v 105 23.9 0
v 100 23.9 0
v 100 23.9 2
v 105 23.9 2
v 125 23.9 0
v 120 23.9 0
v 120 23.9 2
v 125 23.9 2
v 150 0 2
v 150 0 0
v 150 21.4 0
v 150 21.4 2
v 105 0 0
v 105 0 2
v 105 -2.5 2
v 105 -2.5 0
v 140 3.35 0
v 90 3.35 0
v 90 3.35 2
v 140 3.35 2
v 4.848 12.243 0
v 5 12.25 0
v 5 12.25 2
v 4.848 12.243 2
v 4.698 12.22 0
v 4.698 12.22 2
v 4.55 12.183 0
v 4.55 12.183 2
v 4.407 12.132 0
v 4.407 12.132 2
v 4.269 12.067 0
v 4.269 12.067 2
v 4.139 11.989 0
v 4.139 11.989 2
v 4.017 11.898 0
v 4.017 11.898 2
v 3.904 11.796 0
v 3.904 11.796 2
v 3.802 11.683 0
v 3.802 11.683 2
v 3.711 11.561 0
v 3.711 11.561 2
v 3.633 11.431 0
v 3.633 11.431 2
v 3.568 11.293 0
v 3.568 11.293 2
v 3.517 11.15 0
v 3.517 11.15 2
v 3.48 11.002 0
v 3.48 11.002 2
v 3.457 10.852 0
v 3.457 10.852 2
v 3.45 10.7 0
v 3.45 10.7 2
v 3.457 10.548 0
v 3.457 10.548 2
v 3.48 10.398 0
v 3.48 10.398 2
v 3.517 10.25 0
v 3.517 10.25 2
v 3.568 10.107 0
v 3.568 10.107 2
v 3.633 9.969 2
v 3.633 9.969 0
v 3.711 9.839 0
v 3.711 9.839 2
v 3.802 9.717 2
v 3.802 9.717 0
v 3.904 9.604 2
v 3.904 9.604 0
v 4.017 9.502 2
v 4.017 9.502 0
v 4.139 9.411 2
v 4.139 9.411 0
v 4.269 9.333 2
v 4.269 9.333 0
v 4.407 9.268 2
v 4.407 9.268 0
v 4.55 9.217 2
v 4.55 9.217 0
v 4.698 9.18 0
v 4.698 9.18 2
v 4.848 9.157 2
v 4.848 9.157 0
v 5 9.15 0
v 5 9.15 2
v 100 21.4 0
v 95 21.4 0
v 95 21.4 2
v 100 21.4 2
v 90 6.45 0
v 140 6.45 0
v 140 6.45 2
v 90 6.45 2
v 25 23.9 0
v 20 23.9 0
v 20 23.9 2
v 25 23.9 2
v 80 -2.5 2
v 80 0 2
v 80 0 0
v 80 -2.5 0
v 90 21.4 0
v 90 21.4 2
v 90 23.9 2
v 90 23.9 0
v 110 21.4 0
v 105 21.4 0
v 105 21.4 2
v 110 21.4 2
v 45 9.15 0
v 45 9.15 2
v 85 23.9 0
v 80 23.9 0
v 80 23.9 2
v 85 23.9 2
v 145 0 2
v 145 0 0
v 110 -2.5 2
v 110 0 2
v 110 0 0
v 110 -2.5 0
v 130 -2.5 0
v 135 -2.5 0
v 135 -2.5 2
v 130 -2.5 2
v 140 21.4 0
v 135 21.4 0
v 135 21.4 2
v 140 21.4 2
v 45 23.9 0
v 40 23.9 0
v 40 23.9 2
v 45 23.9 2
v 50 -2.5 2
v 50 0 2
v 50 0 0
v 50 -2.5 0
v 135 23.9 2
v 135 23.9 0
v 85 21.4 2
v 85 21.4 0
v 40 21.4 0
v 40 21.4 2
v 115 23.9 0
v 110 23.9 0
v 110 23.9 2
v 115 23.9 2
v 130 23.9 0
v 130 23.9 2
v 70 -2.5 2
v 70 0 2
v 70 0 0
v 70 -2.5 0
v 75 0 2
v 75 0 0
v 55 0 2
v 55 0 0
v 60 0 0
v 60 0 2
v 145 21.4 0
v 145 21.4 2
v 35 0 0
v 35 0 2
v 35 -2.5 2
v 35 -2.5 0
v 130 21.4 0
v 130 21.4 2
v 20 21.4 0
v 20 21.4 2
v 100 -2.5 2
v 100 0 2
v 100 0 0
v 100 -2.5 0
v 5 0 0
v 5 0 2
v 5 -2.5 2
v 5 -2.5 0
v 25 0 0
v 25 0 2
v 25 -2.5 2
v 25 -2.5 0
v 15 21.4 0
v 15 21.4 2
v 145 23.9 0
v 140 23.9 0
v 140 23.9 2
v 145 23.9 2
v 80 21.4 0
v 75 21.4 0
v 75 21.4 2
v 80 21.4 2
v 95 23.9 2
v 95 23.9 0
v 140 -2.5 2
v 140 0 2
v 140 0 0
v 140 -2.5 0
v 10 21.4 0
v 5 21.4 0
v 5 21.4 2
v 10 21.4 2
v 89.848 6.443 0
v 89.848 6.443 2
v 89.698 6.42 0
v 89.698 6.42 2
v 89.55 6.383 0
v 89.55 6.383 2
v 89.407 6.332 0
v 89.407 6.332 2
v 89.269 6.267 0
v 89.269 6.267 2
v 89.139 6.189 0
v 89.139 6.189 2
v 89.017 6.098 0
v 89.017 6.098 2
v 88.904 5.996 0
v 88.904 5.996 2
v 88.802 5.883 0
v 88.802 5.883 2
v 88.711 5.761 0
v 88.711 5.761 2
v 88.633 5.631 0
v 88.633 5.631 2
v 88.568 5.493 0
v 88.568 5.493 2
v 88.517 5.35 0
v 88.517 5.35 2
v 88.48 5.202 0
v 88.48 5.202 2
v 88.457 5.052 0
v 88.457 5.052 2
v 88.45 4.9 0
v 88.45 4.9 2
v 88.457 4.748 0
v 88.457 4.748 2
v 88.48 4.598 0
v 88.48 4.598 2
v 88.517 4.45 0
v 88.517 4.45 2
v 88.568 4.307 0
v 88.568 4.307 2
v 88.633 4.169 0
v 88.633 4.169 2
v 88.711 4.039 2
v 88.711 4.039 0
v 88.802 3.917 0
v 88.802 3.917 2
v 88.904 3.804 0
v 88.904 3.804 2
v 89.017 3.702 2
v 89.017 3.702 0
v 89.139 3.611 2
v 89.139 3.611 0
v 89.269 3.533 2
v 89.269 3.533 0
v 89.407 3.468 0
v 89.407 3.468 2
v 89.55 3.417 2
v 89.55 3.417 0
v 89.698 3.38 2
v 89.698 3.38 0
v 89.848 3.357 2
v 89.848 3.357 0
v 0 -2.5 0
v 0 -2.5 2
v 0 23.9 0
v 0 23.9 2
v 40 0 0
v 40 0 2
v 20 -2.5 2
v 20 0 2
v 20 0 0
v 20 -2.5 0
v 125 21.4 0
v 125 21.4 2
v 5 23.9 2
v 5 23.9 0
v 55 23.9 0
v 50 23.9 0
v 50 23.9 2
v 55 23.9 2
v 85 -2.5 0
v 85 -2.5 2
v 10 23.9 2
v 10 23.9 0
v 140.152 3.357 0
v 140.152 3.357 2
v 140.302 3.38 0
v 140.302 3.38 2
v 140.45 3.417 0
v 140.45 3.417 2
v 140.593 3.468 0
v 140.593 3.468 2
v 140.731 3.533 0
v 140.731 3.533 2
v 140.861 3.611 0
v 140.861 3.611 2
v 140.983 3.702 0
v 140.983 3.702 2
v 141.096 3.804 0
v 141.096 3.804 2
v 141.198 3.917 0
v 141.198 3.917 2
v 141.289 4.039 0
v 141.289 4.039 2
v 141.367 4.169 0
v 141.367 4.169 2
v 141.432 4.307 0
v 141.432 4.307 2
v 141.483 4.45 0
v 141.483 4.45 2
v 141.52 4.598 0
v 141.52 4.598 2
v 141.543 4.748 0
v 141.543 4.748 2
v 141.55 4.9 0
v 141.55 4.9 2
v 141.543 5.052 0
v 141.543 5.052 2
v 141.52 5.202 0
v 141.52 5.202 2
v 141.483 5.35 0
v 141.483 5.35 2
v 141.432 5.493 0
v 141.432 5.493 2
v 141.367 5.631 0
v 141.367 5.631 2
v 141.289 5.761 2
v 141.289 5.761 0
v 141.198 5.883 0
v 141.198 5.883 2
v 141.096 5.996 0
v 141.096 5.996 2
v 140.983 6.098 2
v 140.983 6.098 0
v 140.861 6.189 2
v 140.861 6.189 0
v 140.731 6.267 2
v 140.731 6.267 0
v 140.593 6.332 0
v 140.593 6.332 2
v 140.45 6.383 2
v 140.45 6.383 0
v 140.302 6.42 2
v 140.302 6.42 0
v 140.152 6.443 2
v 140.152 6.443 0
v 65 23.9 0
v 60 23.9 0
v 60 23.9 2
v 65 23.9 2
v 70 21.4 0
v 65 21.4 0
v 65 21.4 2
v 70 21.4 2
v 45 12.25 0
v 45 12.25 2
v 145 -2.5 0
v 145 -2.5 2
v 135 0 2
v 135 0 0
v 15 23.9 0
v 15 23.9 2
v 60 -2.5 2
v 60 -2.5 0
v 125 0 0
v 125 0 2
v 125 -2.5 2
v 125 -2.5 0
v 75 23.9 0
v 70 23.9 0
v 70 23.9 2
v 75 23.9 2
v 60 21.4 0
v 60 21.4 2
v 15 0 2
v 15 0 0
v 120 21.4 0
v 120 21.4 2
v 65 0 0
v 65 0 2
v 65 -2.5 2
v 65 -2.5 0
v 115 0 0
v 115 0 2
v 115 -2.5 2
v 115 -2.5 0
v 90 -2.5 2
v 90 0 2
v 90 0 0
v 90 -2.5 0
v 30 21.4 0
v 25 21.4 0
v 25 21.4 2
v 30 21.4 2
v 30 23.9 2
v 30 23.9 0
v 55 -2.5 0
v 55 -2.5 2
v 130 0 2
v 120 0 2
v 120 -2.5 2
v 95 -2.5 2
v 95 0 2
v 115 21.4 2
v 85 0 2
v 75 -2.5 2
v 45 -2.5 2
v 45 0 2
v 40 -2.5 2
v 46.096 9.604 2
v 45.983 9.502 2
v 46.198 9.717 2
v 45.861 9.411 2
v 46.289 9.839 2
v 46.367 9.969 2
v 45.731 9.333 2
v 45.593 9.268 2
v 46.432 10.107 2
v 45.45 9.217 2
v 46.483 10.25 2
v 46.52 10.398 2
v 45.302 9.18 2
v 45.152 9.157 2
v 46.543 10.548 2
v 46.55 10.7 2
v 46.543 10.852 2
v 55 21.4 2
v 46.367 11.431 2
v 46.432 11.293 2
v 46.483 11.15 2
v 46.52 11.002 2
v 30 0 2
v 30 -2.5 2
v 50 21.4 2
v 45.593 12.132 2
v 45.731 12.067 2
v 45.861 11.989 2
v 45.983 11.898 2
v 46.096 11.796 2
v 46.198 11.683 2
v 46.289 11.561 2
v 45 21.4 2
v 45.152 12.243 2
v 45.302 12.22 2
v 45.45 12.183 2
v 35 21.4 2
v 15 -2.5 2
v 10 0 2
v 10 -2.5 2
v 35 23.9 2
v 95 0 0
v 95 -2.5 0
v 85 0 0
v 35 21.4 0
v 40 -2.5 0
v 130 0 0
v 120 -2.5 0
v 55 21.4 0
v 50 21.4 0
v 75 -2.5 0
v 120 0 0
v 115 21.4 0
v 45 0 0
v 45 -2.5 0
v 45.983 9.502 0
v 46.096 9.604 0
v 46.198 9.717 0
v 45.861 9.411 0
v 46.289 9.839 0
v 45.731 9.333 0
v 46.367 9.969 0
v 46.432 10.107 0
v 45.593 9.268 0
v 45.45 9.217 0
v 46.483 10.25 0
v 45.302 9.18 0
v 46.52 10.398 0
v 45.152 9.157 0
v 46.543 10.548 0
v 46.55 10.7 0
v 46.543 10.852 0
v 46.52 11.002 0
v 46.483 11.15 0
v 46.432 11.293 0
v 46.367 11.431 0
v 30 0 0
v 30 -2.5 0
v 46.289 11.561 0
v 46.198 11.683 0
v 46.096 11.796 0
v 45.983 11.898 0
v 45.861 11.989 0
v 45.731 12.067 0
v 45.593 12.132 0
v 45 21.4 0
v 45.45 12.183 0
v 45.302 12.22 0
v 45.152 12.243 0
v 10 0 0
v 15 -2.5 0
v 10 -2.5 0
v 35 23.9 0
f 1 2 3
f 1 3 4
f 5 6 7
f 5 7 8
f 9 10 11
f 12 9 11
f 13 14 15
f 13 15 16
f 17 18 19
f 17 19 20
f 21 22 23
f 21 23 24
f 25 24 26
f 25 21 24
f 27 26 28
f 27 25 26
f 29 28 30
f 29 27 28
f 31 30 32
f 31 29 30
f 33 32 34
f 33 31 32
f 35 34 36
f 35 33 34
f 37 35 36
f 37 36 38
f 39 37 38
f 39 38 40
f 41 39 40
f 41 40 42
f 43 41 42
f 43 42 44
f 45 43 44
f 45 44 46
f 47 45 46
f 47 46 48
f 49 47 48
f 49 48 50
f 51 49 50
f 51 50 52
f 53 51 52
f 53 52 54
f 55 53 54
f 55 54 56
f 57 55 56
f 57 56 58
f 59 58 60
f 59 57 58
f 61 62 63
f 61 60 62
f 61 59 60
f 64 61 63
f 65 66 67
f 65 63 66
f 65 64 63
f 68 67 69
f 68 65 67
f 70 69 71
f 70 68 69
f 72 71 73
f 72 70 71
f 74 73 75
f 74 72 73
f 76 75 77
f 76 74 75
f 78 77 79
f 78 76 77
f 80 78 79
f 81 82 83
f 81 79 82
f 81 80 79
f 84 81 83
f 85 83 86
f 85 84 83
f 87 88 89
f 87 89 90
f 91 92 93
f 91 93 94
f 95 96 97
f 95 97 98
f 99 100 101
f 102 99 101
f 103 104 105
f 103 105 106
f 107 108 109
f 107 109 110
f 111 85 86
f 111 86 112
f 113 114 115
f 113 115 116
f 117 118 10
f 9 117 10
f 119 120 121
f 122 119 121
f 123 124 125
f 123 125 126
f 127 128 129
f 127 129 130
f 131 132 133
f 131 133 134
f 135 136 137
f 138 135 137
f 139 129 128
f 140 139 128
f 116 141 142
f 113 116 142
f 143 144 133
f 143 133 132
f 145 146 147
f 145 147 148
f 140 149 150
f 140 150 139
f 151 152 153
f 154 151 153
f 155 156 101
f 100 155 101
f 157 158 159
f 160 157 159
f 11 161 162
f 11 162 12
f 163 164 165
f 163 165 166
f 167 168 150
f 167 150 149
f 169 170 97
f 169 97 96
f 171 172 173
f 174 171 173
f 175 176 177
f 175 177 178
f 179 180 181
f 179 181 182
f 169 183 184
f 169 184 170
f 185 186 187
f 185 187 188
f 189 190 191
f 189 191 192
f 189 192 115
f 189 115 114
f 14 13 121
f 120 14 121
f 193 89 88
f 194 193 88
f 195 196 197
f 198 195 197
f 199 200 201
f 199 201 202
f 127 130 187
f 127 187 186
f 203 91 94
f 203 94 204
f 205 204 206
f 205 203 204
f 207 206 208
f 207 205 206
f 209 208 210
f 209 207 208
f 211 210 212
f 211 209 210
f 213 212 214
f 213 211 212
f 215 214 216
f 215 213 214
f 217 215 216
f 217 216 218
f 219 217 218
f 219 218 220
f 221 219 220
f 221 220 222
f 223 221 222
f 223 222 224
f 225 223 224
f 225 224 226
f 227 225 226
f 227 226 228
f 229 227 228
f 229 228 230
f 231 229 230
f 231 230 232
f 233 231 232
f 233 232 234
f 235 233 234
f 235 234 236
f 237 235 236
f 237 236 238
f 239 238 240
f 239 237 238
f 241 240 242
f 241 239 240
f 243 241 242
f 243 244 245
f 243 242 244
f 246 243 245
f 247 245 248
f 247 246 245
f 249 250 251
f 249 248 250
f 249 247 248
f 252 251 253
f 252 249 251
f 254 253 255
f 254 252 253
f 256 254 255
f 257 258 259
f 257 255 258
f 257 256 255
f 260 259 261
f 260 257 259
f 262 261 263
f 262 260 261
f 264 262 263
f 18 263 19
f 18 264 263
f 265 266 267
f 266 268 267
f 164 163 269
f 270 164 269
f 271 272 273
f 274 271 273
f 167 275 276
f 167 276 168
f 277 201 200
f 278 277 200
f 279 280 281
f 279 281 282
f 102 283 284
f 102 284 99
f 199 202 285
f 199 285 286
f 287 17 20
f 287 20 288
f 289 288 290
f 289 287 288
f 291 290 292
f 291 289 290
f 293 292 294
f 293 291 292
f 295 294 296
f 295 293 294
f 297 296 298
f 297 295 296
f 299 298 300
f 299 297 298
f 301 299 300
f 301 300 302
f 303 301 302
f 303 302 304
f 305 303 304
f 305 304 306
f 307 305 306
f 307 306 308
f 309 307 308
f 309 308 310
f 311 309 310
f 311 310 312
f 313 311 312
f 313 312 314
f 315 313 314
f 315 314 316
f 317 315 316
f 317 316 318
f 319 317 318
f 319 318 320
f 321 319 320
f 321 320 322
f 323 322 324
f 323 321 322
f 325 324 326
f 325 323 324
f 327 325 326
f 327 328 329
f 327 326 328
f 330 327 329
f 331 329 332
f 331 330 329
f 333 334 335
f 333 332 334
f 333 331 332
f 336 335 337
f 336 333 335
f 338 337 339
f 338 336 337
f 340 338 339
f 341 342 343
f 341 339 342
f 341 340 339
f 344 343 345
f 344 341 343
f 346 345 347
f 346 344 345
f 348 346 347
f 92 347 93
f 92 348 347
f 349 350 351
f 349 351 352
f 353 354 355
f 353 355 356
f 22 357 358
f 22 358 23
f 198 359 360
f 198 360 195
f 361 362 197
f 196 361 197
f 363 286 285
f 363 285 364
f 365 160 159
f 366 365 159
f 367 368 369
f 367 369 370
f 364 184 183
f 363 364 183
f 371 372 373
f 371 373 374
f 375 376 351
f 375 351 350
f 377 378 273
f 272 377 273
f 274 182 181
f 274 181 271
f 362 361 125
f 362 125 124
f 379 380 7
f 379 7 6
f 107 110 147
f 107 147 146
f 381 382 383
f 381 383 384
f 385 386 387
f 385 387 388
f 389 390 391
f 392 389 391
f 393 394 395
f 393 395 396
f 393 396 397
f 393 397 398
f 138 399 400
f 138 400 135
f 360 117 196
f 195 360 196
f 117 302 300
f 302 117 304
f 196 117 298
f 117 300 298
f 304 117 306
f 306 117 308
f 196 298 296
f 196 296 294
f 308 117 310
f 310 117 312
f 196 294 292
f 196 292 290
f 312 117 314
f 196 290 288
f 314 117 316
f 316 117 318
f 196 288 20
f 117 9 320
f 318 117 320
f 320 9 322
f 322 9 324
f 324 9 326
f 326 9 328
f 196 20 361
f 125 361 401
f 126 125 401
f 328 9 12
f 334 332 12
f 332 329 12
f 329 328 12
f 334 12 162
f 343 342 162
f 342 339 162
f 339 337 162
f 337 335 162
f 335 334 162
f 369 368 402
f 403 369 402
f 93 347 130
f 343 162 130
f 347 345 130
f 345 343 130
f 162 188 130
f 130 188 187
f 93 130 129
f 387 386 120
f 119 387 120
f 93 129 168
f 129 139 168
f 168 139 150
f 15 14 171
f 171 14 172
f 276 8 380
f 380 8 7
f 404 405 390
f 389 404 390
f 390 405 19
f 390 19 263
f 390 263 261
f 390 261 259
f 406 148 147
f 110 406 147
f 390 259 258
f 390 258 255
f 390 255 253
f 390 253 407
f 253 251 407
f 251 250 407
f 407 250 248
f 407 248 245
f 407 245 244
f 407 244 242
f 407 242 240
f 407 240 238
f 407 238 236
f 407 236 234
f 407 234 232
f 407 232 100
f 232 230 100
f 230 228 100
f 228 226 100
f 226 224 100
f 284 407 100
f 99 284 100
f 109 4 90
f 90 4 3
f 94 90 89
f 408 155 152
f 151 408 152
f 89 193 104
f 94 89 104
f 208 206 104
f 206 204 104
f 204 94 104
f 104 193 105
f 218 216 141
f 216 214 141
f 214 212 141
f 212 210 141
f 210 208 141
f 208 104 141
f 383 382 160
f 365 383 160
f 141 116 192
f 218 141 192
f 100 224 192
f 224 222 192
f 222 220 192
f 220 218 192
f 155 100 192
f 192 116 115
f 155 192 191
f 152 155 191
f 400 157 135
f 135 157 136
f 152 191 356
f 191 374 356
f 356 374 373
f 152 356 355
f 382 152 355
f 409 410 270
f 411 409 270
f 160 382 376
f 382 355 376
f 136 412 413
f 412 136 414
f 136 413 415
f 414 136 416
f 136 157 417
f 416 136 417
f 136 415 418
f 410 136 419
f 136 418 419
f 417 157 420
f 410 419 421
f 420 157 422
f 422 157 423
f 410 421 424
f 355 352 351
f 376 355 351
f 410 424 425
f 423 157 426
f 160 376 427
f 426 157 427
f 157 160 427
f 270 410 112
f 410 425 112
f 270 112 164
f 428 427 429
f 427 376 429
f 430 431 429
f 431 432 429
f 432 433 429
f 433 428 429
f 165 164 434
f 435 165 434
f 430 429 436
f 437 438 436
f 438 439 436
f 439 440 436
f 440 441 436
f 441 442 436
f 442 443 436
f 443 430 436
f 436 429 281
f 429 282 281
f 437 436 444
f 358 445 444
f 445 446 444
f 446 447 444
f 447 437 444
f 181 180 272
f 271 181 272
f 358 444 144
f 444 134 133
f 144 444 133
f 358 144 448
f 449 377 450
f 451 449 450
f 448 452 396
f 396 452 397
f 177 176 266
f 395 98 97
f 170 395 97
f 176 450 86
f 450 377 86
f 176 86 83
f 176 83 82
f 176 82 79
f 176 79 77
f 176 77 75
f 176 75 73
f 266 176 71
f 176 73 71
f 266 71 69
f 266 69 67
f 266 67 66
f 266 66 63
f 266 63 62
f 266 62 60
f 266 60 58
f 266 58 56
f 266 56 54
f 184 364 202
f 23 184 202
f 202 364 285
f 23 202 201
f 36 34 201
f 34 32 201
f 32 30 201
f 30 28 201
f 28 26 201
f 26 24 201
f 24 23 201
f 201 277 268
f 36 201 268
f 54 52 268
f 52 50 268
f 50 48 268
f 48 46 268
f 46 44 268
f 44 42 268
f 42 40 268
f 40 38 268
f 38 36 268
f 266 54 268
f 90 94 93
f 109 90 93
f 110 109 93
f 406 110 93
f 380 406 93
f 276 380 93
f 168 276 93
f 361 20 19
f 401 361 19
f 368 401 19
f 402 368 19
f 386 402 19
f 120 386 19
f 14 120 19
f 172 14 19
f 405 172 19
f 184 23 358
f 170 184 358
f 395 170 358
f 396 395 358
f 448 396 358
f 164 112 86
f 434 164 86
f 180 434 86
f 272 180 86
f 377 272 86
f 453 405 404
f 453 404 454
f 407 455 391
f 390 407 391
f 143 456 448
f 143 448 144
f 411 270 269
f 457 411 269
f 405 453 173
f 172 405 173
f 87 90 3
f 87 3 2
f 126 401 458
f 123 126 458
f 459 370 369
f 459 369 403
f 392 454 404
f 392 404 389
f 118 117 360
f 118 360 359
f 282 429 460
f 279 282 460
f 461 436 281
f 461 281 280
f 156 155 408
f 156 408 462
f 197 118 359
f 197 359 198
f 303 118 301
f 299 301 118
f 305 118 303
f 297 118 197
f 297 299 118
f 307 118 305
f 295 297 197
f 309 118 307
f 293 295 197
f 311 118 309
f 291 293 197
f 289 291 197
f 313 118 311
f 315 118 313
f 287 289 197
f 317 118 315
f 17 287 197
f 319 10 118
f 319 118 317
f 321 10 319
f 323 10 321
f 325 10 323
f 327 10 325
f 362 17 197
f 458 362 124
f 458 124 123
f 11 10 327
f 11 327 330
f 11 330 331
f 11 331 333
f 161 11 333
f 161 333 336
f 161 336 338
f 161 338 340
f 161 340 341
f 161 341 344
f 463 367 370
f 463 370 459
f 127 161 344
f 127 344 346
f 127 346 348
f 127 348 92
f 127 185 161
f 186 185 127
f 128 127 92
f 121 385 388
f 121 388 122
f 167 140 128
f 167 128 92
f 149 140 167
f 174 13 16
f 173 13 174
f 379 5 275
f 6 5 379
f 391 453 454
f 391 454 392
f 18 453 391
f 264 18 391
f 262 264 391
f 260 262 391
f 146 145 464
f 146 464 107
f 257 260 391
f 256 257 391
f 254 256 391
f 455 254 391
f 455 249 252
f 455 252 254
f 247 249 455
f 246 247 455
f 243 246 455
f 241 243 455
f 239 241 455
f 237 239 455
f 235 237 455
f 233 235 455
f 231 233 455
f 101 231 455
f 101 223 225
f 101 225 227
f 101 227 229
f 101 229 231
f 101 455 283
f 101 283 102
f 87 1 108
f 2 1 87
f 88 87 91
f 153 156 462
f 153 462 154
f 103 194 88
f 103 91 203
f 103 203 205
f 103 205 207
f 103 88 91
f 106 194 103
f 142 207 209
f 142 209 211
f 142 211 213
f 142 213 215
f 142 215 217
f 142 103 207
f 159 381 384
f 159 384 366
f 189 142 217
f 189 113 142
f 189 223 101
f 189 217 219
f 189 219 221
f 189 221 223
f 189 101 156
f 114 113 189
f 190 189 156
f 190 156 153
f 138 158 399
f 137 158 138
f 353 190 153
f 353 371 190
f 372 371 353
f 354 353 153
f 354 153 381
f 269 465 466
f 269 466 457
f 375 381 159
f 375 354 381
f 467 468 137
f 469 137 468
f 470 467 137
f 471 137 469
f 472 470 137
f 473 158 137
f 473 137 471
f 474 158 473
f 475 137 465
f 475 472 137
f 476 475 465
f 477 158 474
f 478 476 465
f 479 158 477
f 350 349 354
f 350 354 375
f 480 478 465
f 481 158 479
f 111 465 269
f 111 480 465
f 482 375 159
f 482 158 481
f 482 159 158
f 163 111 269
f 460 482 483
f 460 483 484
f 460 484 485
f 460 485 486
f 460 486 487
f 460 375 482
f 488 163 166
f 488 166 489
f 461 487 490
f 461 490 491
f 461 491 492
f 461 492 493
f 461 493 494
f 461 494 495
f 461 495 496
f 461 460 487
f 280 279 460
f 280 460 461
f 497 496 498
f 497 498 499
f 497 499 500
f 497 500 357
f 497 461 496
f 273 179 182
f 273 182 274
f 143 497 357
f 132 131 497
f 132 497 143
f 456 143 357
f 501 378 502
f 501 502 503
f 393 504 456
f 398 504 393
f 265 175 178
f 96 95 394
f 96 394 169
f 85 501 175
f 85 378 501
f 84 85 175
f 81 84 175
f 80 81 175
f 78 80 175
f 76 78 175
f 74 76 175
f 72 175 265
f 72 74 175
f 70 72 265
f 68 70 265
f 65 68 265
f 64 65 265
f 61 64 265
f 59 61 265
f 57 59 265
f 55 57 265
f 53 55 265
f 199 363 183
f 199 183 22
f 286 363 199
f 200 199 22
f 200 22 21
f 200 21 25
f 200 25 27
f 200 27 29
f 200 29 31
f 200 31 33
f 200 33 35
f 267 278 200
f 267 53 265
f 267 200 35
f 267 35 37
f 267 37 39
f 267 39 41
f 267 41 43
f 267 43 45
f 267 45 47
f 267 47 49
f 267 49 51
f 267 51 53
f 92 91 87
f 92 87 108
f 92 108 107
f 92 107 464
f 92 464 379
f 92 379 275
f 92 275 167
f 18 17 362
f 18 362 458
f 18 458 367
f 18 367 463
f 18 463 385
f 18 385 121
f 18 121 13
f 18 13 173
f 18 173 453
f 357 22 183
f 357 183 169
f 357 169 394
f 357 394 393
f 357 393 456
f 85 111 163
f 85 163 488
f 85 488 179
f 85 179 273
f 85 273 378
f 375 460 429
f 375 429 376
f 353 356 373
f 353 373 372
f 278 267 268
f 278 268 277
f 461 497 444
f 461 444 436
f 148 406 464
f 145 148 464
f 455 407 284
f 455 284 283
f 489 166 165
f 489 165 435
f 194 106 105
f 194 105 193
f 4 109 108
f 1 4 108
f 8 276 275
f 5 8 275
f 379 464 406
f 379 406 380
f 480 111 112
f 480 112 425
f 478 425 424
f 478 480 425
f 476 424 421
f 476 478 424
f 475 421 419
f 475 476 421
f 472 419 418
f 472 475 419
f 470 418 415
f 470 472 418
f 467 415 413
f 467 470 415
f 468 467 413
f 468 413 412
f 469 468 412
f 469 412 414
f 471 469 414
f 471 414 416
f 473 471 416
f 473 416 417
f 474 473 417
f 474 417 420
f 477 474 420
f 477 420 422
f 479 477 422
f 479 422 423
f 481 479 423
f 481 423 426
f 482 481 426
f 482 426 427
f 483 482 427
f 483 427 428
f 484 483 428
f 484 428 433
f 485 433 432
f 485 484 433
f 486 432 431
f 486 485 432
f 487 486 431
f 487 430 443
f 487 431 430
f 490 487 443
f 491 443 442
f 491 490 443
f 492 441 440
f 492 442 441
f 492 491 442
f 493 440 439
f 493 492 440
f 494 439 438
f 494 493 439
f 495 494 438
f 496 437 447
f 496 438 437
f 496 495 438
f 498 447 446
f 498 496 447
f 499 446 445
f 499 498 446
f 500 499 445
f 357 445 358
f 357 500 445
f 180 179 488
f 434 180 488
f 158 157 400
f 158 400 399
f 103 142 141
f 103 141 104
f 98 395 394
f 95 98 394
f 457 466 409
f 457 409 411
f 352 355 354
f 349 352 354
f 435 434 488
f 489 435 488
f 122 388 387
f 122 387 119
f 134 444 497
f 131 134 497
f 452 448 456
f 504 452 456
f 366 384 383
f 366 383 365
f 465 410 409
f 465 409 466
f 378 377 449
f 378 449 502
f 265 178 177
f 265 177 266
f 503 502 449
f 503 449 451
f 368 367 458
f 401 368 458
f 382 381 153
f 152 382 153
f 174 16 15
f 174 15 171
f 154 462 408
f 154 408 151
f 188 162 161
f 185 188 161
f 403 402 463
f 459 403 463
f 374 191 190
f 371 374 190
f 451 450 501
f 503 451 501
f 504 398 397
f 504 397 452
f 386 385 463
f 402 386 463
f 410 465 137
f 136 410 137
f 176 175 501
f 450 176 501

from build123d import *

# Parameters (mm, degrees)
SKETCH1_W           = 150
SKETCH1_H           = 21.4
BOSS_EXTRUDE2_DEPTH = 2
SKETCH2_W           = 5
SKETCH2_H           = 2
BOSS_EXTRUDE3_DEPTH = 2.5
LPATTERN1_COUNT     = 15
LPATTERN1_PITCH     = 10
SKETCH3_W           = 5
SKETCH3_H           = 2
BOSS_EXTRUDE4_DEPTH = 2.5
LPATTERN2_COUNT     = 15
LPATTERN2_PITCH     = 10
CUT_EXTRUDE1_DEPTH  = 10


with BuildPart() as part:
    # Sketch1 → Boss-Extrude2 (new body)
    with BuildSketch(Plane.XY):
        with Locations((75, 10.7)):
            Rectangle(SKETCH1_W, SKETCH1_H)
    extrude(amount=BOSS_EXTRUDE2_DEPTH)

    # Sketch2 → Boss-Extrude3 (add)
    with BuildSketch(Plane(origin=(0, 21.4, 0), x_dir=(1, 0, 0), z_dir=(0, 1, 0))):
        with Locations((2.5, -1)):
            Rectangle(SKETCH2_W, SKETCH2_H)
    boss_extrude3 = extrude(amount=BOSS_EXTRUDE3_DEPTH)

    # LPattern1: Boss-Extrude3 ×15
    with Locations(*[(i * LPATTERN1_PITCH, 0, 0) for i in range(1, LPATTERN1_COUNT)]):
        add(boss_extrude3)

    # Sketch3 → Boss-Extrude4 (add)
    with BuildSketch(Plane(origin=(0, 0, 0), x_dir=(-1, 0, 0), z_dir=(0, -1, 0))):
        with Locations((-2.5, -1)):
            Rectangle(SKETCH3_W, SKETCH3_H)
    boss_extrude4 = extrude(amount=BOSS_EXTRUDE4_DEPTH)

    # LPattern2: Boss-Extrude4 ×15
    with Locations(*[(i * LPATTERN2_PITCH, 0, 0) for i in range(1, LPATTERN2_COUNT)]):
        add(boss_extrude4)

    # Sketch4 → Cut-Extrude1 (cut)
    with BuildSketch(Plane(origin=(0, 0, 0), x_dir=(-1, 0, 0), z_dir=(0, 0, -1))):
        with BuildLine():
            Line((-140, 6.45), (-90, 6.45))
            ThreePointArc((-90, 6.45), (-88.45, 4.9), (-90, 3.35))
            Line((-90, 3.35), (-140, 3.35))
            ThreePointArc((-140, 3.35), (-141.55, 4.9), (-140, 6.45))
        make_face()
        with BuildLine():
            Line((-45, 12.25), (-5, 12.25))
            ThreePointArc((-5, 12.25), (-3.45, 10.7), (-5, 9.15))
            Line((-5, 9.15), (-45, 9.15))
            ThreePointArc((-45, 9.15), (-46.55, 10.7), (-45, 12.25))
        make_face()
    extrude(amount=-CUT_EXTRUDE1_DEPTH, mode=Mode.SUBTRACT)


solid = part.part
